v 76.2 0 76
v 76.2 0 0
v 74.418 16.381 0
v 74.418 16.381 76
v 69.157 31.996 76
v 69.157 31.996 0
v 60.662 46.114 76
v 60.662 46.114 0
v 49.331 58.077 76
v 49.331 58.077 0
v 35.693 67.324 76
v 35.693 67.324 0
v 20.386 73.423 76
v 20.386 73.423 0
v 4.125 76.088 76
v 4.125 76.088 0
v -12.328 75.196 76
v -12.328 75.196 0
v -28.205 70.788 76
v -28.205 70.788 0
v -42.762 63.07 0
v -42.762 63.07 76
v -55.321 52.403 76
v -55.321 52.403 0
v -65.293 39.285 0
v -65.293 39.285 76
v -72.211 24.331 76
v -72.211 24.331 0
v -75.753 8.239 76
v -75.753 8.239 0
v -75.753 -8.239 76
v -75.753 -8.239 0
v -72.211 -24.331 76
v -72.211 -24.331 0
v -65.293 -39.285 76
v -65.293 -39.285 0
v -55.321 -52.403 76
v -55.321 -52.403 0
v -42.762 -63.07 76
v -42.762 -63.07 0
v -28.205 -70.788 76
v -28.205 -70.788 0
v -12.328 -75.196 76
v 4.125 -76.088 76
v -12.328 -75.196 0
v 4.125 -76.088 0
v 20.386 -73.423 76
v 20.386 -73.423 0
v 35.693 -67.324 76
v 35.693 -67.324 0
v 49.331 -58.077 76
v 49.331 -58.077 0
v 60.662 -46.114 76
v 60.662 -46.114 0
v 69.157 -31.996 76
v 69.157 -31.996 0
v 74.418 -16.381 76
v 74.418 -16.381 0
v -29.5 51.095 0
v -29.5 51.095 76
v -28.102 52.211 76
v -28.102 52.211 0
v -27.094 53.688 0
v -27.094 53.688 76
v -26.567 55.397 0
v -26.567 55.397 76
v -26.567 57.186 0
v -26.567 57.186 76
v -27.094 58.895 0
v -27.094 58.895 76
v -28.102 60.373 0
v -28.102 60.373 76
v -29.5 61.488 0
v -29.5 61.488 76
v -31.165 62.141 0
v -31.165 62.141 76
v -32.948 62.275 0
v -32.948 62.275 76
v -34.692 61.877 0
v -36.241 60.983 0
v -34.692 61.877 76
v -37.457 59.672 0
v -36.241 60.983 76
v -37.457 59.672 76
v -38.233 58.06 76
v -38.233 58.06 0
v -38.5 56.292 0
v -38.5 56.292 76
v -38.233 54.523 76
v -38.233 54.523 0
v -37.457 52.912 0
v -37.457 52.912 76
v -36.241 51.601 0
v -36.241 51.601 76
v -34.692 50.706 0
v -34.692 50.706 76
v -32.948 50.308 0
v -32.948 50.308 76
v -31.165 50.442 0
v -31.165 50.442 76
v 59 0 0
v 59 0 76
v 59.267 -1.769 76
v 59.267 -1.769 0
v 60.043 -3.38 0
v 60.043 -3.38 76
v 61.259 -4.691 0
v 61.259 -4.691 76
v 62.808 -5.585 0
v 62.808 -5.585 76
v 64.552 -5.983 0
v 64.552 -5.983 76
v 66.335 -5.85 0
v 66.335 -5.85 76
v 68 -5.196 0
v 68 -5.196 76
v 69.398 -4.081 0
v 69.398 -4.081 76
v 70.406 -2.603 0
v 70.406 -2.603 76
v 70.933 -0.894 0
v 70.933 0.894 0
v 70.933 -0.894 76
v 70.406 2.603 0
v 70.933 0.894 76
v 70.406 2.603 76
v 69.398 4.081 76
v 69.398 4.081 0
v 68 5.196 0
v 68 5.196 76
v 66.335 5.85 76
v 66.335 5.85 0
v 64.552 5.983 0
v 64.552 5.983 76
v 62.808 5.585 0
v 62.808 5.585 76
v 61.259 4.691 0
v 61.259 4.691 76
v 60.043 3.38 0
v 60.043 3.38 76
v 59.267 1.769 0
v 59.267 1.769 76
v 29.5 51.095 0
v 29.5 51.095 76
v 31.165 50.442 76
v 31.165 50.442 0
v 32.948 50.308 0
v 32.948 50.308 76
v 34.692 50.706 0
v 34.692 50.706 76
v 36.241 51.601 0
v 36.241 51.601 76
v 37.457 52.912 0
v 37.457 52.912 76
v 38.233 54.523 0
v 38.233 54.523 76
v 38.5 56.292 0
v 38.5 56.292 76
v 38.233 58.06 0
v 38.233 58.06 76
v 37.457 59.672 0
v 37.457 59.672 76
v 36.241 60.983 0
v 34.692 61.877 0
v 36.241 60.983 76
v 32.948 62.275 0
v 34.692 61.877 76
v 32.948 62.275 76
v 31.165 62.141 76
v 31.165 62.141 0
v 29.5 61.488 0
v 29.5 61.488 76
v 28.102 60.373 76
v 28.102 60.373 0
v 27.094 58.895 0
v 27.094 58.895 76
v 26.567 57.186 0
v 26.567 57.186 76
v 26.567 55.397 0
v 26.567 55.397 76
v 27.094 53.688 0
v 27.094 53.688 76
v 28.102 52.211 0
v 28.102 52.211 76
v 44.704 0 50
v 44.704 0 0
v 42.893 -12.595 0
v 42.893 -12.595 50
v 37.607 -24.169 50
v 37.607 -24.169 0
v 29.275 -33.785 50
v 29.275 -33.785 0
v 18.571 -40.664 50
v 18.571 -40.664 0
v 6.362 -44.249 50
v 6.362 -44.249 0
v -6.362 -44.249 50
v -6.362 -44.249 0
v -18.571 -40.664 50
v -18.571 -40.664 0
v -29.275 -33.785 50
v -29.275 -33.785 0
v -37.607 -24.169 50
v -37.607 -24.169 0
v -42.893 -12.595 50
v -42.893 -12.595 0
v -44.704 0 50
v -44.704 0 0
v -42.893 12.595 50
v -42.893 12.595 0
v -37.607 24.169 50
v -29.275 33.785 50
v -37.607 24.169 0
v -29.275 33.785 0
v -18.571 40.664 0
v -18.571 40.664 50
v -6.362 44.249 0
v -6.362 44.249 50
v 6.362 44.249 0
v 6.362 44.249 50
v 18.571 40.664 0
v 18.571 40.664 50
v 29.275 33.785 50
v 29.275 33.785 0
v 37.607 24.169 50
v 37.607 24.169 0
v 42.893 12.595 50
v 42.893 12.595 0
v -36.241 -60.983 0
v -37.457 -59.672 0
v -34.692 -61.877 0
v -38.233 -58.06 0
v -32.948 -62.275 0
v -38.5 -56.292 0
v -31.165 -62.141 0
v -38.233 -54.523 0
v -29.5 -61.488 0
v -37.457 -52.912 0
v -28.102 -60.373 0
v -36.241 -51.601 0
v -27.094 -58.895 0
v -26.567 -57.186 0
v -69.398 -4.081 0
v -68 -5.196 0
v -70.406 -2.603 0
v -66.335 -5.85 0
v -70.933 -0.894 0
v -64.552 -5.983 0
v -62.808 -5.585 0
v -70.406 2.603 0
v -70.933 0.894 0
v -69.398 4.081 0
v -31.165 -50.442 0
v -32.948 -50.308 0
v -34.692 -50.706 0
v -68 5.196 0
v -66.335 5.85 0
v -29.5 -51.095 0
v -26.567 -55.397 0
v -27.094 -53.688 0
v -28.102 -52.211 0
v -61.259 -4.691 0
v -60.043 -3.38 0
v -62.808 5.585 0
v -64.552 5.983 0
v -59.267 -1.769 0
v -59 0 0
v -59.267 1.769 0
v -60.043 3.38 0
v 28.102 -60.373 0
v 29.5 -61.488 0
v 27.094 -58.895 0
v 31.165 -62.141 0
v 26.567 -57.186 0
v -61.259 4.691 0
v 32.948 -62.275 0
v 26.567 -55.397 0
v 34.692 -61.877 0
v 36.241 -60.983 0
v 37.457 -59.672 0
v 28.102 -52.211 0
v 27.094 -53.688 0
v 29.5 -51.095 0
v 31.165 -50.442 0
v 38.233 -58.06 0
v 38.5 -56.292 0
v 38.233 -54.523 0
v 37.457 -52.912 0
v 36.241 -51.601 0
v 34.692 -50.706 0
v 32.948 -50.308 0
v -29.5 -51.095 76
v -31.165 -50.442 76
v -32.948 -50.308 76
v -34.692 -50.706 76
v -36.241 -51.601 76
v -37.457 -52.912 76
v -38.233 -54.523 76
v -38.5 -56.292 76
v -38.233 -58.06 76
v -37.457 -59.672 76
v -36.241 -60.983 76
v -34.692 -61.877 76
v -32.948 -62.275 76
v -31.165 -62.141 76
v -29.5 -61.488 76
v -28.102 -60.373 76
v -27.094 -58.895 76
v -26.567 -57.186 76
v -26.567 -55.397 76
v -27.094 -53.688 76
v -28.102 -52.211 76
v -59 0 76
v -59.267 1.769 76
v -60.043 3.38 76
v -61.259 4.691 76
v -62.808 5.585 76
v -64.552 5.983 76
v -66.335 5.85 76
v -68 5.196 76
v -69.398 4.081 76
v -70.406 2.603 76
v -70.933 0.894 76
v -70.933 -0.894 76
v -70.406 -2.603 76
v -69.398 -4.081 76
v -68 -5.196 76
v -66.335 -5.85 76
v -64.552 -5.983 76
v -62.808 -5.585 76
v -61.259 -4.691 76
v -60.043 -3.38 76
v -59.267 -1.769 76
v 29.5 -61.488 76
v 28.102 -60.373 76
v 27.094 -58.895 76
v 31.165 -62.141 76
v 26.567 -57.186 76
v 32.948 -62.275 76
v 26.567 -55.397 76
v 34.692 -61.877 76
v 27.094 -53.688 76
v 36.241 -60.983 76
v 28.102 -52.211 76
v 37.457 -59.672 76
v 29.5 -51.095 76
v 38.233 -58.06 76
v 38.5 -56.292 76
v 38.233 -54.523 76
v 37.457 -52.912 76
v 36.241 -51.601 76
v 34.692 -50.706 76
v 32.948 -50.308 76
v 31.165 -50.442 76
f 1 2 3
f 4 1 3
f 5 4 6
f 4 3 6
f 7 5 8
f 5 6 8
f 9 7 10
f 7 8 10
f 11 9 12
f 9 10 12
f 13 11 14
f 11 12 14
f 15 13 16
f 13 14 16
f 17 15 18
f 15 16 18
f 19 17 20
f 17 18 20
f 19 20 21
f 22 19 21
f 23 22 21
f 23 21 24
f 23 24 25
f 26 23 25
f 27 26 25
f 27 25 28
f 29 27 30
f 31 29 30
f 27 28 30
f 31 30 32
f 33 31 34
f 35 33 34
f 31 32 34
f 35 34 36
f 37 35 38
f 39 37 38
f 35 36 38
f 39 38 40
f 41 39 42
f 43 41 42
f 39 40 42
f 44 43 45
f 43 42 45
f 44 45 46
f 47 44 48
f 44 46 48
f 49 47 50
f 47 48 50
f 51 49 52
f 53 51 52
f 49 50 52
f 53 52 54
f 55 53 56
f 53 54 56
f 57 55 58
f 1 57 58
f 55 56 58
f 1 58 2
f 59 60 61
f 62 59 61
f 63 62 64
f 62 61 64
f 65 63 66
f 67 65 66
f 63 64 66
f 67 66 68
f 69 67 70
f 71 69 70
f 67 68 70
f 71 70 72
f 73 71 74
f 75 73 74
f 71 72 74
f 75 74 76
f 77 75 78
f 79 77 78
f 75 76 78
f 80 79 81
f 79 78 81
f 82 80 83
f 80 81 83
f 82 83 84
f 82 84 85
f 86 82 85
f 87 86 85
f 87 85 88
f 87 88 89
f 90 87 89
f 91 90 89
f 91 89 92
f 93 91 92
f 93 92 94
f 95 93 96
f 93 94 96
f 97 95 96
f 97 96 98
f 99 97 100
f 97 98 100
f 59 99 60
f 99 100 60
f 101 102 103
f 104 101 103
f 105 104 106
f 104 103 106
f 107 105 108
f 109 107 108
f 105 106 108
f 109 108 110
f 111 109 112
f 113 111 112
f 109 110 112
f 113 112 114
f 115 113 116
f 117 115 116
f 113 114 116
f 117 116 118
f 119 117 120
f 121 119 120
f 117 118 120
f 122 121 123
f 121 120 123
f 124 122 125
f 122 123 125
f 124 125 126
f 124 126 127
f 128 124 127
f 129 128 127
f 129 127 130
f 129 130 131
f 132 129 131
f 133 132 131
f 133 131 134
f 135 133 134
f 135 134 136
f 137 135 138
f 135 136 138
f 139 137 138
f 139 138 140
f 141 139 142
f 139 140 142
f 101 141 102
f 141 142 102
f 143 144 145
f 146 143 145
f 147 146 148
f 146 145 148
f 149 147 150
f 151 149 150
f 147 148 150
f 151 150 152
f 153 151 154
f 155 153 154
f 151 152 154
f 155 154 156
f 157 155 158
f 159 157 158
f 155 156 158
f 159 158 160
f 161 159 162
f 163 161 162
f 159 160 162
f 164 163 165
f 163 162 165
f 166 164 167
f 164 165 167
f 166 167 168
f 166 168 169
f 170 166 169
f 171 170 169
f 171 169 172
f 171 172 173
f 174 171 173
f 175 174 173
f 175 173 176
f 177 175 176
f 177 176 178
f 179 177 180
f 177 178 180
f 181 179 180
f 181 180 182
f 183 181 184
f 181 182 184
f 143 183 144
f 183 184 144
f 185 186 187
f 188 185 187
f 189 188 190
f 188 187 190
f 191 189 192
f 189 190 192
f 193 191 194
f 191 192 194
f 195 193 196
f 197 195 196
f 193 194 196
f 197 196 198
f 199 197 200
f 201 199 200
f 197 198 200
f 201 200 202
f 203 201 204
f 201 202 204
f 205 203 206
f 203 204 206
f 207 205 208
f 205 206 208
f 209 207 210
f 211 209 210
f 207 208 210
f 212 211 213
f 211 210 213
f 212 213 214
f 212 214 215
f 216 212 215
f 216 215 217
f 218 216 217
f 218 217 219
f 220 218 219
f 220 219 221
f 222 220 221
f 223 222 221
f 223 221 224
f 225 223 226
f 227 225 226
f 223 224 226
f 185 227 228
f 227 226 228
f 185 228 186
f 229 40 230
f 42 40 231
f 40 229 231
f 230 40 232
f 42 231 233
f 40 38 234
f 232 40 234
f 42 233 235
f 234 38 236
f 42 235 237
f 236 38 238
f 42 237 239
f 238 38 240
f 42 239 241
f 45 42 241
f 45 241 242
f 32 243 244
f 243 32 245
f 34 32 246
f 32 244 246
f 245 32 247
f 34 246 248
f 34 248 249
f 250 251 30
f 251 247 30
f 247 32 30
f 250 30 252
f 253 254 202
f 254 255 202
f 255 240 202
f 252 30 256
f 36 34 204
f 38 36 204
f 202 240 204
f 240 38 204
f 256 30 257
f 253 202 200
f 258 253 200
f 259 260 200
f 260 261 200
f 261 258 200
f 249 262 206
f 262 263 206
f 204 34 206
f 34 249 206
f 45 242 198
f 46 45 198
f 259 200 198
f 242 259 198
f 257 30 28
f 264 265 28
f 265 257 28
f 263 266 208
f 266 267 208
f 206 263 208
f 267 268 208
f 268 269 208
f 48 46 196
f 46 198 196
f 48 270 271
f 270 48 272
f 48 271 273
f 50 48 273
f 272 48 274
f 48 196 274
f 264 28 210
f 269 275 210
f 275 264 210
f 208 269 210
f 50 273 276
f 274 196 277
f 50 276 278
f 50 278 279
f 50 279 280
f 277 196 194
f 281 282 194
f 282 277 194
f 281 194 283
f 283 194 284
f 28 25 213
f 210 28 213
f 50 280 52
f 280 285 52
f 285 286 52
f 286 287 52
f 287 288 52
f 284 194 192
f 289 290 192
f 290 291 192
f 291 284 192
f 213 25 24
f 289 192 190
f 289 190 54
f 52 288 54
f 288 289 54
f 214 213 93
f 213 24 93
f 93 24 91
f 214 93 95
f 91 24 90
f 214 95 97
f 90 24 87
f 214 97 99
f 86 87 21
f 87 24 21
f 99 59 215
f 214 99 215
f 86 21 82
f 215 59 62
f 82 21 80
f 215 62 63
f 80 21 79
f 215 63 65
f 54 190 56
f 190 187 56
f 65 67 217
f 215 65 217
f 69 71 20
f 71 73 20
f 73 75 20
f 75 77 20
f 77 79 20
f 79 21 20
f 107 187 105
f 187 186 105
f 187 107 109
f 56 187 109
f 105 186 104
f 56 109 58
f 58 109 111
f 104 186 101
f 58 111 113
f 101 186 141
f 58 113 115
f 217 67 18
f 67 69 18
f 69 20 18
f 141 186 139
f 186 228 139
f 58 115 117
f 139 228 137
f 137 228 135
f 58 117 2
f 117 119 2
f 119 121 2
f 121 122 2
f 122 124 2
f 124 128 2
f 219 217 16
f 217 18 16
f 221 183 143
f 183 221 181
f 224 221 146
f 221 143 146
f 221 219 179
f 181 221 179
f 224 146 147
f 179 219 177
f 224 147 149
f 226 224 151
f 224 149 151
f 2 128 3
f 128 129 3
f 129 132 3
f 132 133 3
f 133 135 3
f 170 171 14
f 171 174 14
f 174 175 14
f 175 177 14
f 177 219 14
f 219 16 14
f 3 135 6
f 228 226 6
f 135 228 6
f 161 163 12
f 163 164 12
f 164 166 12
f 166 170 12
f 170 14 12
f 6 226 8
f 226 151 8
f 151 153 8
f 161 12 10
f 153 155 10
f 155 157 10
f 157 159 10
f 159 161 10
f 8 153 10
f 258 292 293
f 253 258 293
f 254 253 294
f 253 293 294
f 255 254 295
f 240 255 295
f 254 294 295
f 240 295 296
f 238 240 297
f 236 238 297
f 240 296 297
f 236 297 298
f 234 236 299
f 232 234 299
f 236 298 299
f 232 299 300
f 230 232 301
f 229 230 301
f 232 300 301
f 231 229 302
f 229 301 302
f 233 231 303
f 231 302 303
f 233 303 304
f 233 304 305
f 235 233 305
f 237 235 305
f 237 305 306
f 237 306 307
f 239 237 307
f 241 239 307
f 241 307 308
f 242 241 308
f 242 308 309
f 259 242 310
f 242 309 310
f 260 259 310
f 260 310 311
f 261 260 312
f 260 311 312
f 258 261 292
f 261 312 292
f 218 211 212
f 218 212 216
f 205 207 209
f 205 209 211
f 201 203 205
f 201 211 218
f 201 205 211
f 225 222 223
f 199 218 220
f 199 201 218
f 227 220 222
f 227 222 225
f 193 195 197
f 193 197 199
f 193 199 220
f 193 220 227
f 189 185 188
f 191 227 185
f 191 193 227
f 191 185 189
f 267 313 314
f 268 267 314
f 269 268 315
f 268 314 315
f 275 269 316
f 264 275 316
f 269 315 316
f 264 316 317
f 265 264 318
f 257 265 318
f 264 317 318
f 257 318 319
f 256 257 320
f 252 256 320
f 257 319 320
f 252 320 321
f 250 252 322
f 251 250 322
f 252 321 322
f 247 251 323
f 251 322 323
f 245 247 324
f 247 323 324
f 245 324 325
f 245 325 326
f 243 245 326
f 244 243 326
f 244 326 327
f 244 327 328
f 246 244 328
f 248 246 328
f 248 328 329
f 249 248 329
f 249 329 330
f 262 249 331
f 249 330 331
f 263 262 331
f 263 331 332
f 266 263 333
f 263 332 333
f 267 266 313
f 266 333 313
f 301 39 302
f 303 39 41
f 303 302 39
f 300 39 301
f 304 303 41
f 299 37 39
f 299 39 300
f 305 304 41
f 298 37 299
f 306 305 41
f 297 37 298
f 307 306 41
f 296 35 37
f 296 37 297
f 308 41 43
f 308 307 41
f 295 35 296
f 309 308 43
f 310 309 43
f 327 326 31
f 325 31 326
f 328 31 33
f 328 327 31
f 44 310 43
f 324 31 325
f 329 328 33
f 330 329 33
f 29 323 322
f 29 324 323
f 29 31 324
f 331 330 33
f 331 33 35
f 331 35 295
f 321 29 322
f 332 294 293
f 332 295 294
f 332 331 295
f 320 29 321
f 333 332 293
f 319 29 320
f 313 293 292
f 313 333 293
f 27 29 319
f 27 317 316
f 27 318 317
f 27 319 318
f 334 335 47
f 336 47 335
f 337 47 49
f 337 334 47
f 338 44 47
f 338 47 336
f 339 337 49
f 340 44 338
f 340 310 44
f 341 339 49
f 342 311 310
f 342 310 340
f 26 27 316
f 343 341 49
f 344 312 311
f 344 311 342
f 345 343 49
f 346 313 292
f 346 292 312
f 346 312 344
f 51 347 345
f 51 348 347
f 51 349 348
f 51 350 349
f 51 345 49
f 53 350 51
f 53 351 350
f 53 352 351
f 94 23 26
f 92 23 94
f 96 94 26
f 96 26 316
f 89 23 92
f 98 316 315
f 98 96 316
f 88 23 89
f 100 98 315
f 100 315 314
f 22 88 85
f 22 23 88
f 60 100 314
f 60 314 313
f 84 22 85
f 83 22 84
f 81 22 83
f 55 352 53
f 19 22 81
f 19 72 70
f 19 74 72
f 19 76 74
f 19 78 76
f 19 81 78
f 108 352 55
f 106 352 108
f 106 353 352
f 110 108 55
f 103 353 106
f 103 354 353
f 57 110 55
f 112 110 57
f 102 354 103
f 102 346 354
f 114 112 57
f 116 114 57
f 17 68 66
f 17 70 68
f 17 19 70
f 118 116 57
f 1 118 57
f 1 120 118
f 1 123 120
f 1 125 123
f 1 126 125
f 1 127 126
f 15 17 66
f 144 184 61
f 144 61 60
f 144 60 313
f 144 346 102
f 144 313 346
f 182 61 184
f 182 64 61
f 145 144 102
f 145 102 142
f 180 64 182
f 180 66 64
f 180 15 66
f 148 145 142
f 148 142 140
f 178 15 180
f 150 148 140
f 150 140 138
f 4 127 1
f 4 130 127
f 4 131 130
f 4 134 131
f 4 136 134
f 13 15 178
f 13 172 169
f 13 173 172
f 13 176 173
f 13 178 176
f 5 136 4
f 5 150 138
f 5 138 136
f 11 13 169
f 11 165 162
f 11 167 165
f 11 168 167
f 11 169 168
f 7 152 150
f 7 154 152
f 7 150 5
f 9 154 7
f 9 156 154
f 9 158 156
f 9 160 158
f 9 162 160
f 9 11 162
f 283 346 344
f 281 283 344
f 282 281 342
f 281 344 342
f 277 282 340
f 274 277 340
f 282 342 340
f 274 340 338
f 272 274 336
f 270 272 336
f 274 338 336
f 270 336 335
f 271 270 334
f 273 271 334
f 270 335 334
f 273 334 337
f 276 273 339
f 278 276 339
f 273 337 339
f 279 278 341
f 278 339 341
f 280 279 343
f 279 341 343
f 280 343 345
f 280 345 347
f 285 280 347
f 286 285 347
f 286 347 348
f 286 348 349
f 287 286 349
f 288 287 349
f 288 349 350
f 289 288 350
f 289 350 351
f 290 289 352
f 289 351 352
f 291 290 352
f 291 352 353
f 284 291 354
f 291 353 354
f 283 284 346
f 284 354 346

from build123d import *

# Parameters (mm, degrees)
F0_R            = 76.2
F1_DEPTH        = 76
F2_R            = 44.704
F3_DEPTH        = 50
F4_R            = 6
F5_DEPTH        = 76
F5_COPIES_COUNT = 6


# Not quite as in the source:
# - a pattern or mirror of a feature is missing from the dataset's text; its kind, count and spacing are read off the source's solid


with BuildPart() as f1:
    # F0 (on Top) → F1 (new body)
    with BuildSketch(Plane.XY):
        Circle(F0_R)
    extrude(amount=F1_DEPTH)

    # F2 (on face) → F3 (cut)
    with BuildSketch(Plane(origin=(0, 0, 0), x_dir=(1, 0, 0), z_dir=(0, 0, -1))):
        Circle(F2_R)
    extrude(amount=-F3_DEPTH, mode=Mode.SUBTRACT)

    # F4 (on face) → F5 (cut)
    with BuildSketch(Plane.XY.offset(76)):
        with Locations((-65, 0)):
            Circle(F4_R)
    f5 = extrude(amount=-F5_DEPTH, mode=Mode.SUBTRACT)

    # F5_copies: F5 ×6 about axis
    f5_copies_axis = Axis((0, 0, 0), (0, 0, 1))
    for i in range(1, F5_COPIES_COUNT):
        add(f5.rotate(f5_copies_axis, i * 360 / F5_COPIES_COUNT), mode=Mode.SUBTRACT)


solid = f1.part
